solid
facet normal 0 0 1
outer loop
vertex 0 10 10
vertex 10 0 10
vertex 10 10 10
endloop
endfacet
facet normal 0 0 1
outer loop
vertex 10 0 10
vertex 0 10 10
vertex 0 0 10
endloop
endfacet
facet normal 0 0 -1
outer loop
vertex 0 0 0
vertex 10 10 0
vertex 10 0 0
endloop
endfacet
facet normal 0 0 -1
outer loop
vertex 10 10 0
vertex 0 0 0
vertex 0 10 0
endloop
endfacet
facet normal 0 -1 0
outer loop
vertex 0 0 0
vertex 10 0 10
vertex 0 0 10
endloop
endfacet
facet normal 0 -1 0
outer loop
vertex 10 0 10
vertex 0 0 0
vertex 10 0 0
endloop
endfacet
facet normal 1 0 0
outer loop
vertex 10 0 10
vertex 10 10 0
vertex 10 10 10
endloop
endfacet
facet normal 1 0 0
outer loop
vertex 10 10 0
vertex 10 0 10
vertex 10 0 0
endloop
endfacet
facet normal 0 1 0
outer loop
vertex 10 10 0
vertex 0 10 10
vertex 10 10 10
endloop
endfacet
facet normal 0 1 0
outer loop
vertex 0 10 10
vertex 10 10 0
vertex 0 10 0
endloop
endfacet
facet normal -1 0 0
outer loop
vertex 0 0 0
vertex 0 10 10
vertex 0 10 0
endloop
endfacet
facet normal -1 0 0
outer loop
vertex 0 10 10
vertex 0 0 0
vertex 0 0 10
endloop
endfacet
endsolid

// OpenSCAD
// file: ../scad/lib/tube_sizes.scad
// TubeSize struct and standard tube definitions
// Hybrid accessor pattern: indexed lists with constructor and accessor functions

include <bolt_sizes.scad>

// Fabrication constraints
fibreseeker_max_z = 245;  // FibreSeeker 3 maximum Z height in mm
max_tube_length = fibreseeker_max_z;  // Maximum printable tube length

// Internal indices (private)
_TUBE_OUTER_RADIUS = 0;
_TUBE_THICKNESS = 1;
_TUBE_INNER_SLEEVE_DEPTH = 2;
_TUBE_INNER_SLEEVE_THICKNESS = 3;
_TUBE_INNER_SLEEVE_CLEARANCE = 4;
_TUBE_SOCKET_DEPTH = 5;
_TUBE_SOCKET_CLEARANCE = 6;
_TUBE_EXTENSION_DEPTH = 7;
_TUBE_COLLAR_THICKNESS = 8;
_TUBE_PINCH_SEPARATION = 9;
_TUBE_BOLT_SIZE = 10;

// Constructor
function TubeSize(outer_r, thickness, inner_sleeve_depth, inner_sleeve_thickness, inner_sleeve_clearance, socket_depth, socket_clearance, extension_depth, collar_thickness, pinch_separation, bolt_size) =
    [outer_r, thickness, inner_sleeve_depth, inner_sleeve_thickness, inner_sleeve_clearance, socket_depth, socket_clearance, extension_depth, collar_thickness, pinch_separation, bolt_size];

// Accessors
function tube_outer_radius(ts) = ts[_TUBE_OUTER_RADIUS];
function tube_thickness(ts) = ts[_TUBE_THICKNESS];
function tube_inner_sleeve_depth(ts) = ts[_TUBE_INNER_SLEEVE_DEPTH];
function tube_inner_sleeve_thickness(ts) = ts[_TUBE_INNER_SLEEVE_THICKNESS];
function tube_inner_sleeve_clearance(ts) = ts[_TUBE_INNER_SLEEVE_CLEARANCE];
function tube_socket_depth(ts) = ts[_TUBE_SOCKET_DEPTH];
function tube_socket_clearance(ts) = ts[_TUBE_SOCKET_CLEARANCE];
function tube_extension_depth(ts) = ts[_TUBE_EXTENSION_DEPTH];
function tube_collar_thickness(ts) = ts[_TUBE_COLLAR_THICKNESS];
function tube_pinch_separation(ts) = ts[_TUBE_PINCH_SEPARATION];
function tube_bolt_size(ts) = ts[_TUBE_BOLT_SIZE];

// Standard tube sizes based on current frame design
// Standard 1-1/8" straight steerer (28.6mm OD, 25mm ID)
HEAD_TUBE = TubeSize(
    14.3,                // outer_radius (28.6mm OD - standard 1-1/8" steerer)
    1.8,                 // thickness (25mm ID)
    30,                  // inner_sleeve_depth
    3,                   // inner_sleeve_thickness
    0.25,                // inner_sleeve_clearance
    40,                  // socket_depth
    0.25,                // socket_clearance
    70,                  // extension_depth
    10,                   // collar_thickness
    1.5,                 // pinch_separation
    M5_BOLT              // bolt_size (M5 for head tube pinch)
);

// Stepped bore upper section (2mm step for seating shoulder)
HEAD_TUBE_UPPER = TubeSize(
    12.3,                    // outer_radius (24.6mm OD - 2mm step for seating)
    1.8,                     // thickness
    30,                      // inner_sleeve_depth
    3,                       // inner_sleeve_thickness
    0.25,                    // inner_sleeve_clearance
    40,                      // socket_depth
    0.25,                    // socket_clearance
    70,                      // extension_depth
    6,                       // collar_thickness
    1.5,                     // pinch_separation
    M5_BOLT                  // bolt_size
);

DOWN_TUBE = TubeSize(
    22,     // outer_radius (44mm OD)
    3,      // thickness
    30,     // inner_sleeve_depth
    3.5,    // inner_sleeve_thickness
    0.25,   // inner_sleeve_clearance
    40,     // socket_depth
    0.25,   // socket_clearance
    90,     // extension_depth
    6,      // collar_thickness
    1.5,    // pinch_separation
    M6_BOLT // bolt_size
);

SEAT_TUBE = TubeSize(
    17,     // outer_radius (34mm OD)
    3.4,    // thickness (ID = 27.2mm for seatpost)
    30,     // inner_sleeve_depth
    3,      // inner_sleeve_thickness
    0.25,   // inner_sleeve_clearance
    40,     // socket_depth
    0.25,   // socket_clearance
    80,     // extension_depth
    6,      // collar_thickness
    1.2,    // pinch_separation
    M6_BOLT // bolt_size
);

TOP_TUBE = TubeSize(
    16,     // outer_radius (32mm OD)
    2.5,    // thickness
    30,     // inner_sleeve_depth
    3,      // inner_sleeve_thickness
    0.25,   // inner_sleeve_clearance
    40,     // socket_depth
    0.25,   // socket_clearance
    80,     // extension_depth
    6,      // collar_thickness
    1,      // pinch_separation
    M6_BOLT // bolt_size
);

CHAINSTAY = TubeSize(
    11,     // outer_radius (22mm OD)
    2.5,    // thickness
    30,     // inner_sleeve_depth
    2.5,    // inner_sleeve_thickness
    0.25,   // inner_sleeve_clearance
    30,     // socket_depth
    0.25,   // socket_clearance
    50,     // extension_depth
    5,      // collar_thickness
    0.8,    // pinch_separation
    M5_BOLT // bolt_size (smaller bolts for chainstays)
);

SEATSTAY = TubeSize(
    8,      // outer_radius (16mm OD)
    2,      // thickness
    30,     // inner_sleeve_depth
    2,      // inner_sleeve_thickness
    0.25,   // inner_sleeve_clearance
    30,     // socket_depth
    0.25,   // socket_clearance
    50,     // extension_depth
    5,      // collar_thickness
    0.7,    // pinch_separation
    M5_BOLT // bolt_size (smaller bolts for seatstays)
);

SEAT_POST = TubeSize(
    13.6,   // outer_radius (27.2mm OD - standard seatpost)
    1.5,    // thickness (wall thickness)
    0,      // inner_sleeve_depth (N/A - seatpost doesn't section)
    0,      // inner_sleeve_thickness (N/A)
    0,      // inner_sleeve_clearance (N/A)
    0,      // socket_depth (N/A - seatpost inserts into seat tube)
    0.25,   // socket_clearance (clearance between seatpost and seat tube)
    0,      // extension_depth (N/A)
    4,      // collar_thickness (seat collar wall thickness)
    0,      // pinch_separation (N/A)
    M5_BOLT // bolt_size (seat collar uses M5)
);
// file: ../scad/lib/bolt_sizes.scad
// BoltSize struct and standard bolt definitions
// Hybrid accessor pattern: indexed lists with constructor and accessor functions

// Internal indices (private)
_BOLT_TAP_RADIUS = 0;
_BOLT_CLEARANCE_RADIUS = 1;
_BOLT_COUNTERBORE_RADIUS = 2;
_BOLT_COUNTERBORE_DEPTH = 3;
_BOLT_BOSS_RADIUS = 4;
_BOLT_THROUGH_RADIUS = 5;

// Constructor
function BoltSize(tap_r, clearance_r, counterbore_r, counterbore_d, boss_r, through_r) =
    [tap_r, clearance_r, counterbore_r, counterbore_d, boss_r, through_r];

// Accessors
function bolt_tap_radius(bs) = bs[_BOLT_TAP_RADIUS];
function bolt_clearance_radius(bs) = bs[_BOLT_CLEARANCE_RADIUS];
function bolt_counterbore_radius(bs) = bs[_BOLT_COUNTERBORE_RADIUS];
function bolt_counterbore_depth(bs) = bs[_BOLT_COUNTERBORE_DEPTH];
function bolt_boss_radius(bs) = bs[_BOLT_BOSS_RADIUS];
function bolt_through_radius(bs) = bs[_BOLT_THROUGH_RADIUS];

// Standard bolt sizes
M5_BOLT = BoltSize(
    2.1,    // tap_radius (M5 tap drill 4.2mm diameter)
    2.75,   // clearance_radius (5.5mm clearance hole)
    4.25,   // counterbore_radius (8.5mm socket head)
    2.5,    // counterbore_depth
    4.25,   // boss_radius
    2.75    // through_radius (5.5mm in plastic)
);

M6_BOLT = BoltSize(
    2.5,    // tap_radius (M6 tap drill 5.0mm diameter)
    3.25,   // clearance_radius (6.5mm clearance hole)
    4.75,   // counterbore_radius (9.5mm socket head)
    2.5,    // counterbore_depth
    4.75,    // boss_radius
    3.25    // through_radius (6.5mm in plastic)
);
// file: ../scad/lib/helpers.scad
// Helper functions for ebike frame primitives

// Convert direction vector to Euler angles for use with rotate()
// Input: direction vector [x, y, z]
// Output: Euler angles [rx, ry, rz] compatible with OpenSCAD rotate()
function vector_to_euler(v) =
    let(
        // Normalize the vector
        len = norm(v),
        u = len > 0 ? v / len : [0, 0, 1],

        // Calculate rotation angles
        // ry: rotation around Y axis (in XZ plane)
        ry = atan2(u[0], u[2]),

        // rx: rotation around X axis (elevation)
        rx = -atan2(u[1], sqrt(u[0]*u[0] + u[2]*u[2])),

        // rz: no roll (keep vertical orientation)
        rz = 0
    )
    [rx, ry, rz];

// Transform world coordinates to local coordinates
// Rotates by -angle around Y axis and translates by -origin
// Input: world_pos - position in world coordinates
//        origin - origin of local coordinate system in world coordinates
//        angle - rotation angle in degrees around Y axis
// Output: position in local coordinates
function world_to_local(world_pos, origin, angle) =
    let(
        offset = world_pos - origin,
        cos_a = cos(angle),
        sin_a = sin(angle)
    )
    [
        offset[0] * cos_a - offset[2] * sin_a,
        offset[1],
        offset[0] * sin_a + offset[2] * cos_a
    ];
// main file
// Phase 1 Verification: Test BoltSize and TubeSize structs

include <../scad/lib/helpers.scad>
include <../scad/lib/bolt_sizes.scad>
include <../scad/lib/tube_sizes.scad>

// Test BoltSize accessors
echo("=== M6 Bolt Tests ===");
echo("M6 tap radius:", bolt_tap_radius(M6_BOLT));
echo("M6 clearance radius:", bolt_clearance_radius(M6_BOLT));
echo("M6 counterbore radius:", bolt_counterbore_radius(M6_BOLT));
echo("M6 boss radius:", bolt_boss_radius(M6_BOLT));

echo("=== M5 Bolt Tests ===");
echo("M5 tap radius:", bolt_tap_radius(M5_BOLT));
echo("M5 clearance radius:", bolt_clearance_radius(M5_BOLT));

// Test TubeSize accessors
echo("=== Down Tube Tests ===");
echo("Down tube outer radius:", tube_outer_radius(DOWN_TUBE));
echo("Down tube thickness:", tube_thickness(DOWN_TUBE));
echo("Down tube socket depth:", tube_socket_depth(DOWN_TUBE));
echo("Down tube extension depth:", tube_extension_depth(DOWN_TUBE));

echo("=== Seat Tube Tests ===");
echo("Seat tube outer radius:", tube_outer_radius(SEAT_TUBE));
echo("Seat tube bolt tap radius:", bolt_tap_radius(tube_bolt_size(SEAT_TUBE)));

echo("=== Chainstay Tests ===");
echo("Chainstay outer radius:", tube_outer_radius(CHAINSTAY));
echo("Chainstay bolt (M5) tap radius:", bolt_tap_radius(tube_bolt_size(CHAINSTAY)));

// Test vector_to_euler helper
echo("=== vector_to_euler Tests ===");
test_vec1 = [1, 0, 0];
test_vec2 = [0, 1, 0];
test_vec3 = [0, 0, 1];
test_vec4 = [1, 1, 1];
echo("Vector [1,0,0] -> Euler:", vector_to_euler(test_vec1));
echo("Vector [0,1,0] -> Euler:", vector_to_euler(test_vec2));
echo("Vector [0,0,1] -> Euler:", vector_to_euler(test_vec3));
echo("Vector [1,1,1] -> Euler:", vector_to_euler(test_vec4));

// Simple visual test - render a cube if everything parses
cube([10, 10, 10]);
